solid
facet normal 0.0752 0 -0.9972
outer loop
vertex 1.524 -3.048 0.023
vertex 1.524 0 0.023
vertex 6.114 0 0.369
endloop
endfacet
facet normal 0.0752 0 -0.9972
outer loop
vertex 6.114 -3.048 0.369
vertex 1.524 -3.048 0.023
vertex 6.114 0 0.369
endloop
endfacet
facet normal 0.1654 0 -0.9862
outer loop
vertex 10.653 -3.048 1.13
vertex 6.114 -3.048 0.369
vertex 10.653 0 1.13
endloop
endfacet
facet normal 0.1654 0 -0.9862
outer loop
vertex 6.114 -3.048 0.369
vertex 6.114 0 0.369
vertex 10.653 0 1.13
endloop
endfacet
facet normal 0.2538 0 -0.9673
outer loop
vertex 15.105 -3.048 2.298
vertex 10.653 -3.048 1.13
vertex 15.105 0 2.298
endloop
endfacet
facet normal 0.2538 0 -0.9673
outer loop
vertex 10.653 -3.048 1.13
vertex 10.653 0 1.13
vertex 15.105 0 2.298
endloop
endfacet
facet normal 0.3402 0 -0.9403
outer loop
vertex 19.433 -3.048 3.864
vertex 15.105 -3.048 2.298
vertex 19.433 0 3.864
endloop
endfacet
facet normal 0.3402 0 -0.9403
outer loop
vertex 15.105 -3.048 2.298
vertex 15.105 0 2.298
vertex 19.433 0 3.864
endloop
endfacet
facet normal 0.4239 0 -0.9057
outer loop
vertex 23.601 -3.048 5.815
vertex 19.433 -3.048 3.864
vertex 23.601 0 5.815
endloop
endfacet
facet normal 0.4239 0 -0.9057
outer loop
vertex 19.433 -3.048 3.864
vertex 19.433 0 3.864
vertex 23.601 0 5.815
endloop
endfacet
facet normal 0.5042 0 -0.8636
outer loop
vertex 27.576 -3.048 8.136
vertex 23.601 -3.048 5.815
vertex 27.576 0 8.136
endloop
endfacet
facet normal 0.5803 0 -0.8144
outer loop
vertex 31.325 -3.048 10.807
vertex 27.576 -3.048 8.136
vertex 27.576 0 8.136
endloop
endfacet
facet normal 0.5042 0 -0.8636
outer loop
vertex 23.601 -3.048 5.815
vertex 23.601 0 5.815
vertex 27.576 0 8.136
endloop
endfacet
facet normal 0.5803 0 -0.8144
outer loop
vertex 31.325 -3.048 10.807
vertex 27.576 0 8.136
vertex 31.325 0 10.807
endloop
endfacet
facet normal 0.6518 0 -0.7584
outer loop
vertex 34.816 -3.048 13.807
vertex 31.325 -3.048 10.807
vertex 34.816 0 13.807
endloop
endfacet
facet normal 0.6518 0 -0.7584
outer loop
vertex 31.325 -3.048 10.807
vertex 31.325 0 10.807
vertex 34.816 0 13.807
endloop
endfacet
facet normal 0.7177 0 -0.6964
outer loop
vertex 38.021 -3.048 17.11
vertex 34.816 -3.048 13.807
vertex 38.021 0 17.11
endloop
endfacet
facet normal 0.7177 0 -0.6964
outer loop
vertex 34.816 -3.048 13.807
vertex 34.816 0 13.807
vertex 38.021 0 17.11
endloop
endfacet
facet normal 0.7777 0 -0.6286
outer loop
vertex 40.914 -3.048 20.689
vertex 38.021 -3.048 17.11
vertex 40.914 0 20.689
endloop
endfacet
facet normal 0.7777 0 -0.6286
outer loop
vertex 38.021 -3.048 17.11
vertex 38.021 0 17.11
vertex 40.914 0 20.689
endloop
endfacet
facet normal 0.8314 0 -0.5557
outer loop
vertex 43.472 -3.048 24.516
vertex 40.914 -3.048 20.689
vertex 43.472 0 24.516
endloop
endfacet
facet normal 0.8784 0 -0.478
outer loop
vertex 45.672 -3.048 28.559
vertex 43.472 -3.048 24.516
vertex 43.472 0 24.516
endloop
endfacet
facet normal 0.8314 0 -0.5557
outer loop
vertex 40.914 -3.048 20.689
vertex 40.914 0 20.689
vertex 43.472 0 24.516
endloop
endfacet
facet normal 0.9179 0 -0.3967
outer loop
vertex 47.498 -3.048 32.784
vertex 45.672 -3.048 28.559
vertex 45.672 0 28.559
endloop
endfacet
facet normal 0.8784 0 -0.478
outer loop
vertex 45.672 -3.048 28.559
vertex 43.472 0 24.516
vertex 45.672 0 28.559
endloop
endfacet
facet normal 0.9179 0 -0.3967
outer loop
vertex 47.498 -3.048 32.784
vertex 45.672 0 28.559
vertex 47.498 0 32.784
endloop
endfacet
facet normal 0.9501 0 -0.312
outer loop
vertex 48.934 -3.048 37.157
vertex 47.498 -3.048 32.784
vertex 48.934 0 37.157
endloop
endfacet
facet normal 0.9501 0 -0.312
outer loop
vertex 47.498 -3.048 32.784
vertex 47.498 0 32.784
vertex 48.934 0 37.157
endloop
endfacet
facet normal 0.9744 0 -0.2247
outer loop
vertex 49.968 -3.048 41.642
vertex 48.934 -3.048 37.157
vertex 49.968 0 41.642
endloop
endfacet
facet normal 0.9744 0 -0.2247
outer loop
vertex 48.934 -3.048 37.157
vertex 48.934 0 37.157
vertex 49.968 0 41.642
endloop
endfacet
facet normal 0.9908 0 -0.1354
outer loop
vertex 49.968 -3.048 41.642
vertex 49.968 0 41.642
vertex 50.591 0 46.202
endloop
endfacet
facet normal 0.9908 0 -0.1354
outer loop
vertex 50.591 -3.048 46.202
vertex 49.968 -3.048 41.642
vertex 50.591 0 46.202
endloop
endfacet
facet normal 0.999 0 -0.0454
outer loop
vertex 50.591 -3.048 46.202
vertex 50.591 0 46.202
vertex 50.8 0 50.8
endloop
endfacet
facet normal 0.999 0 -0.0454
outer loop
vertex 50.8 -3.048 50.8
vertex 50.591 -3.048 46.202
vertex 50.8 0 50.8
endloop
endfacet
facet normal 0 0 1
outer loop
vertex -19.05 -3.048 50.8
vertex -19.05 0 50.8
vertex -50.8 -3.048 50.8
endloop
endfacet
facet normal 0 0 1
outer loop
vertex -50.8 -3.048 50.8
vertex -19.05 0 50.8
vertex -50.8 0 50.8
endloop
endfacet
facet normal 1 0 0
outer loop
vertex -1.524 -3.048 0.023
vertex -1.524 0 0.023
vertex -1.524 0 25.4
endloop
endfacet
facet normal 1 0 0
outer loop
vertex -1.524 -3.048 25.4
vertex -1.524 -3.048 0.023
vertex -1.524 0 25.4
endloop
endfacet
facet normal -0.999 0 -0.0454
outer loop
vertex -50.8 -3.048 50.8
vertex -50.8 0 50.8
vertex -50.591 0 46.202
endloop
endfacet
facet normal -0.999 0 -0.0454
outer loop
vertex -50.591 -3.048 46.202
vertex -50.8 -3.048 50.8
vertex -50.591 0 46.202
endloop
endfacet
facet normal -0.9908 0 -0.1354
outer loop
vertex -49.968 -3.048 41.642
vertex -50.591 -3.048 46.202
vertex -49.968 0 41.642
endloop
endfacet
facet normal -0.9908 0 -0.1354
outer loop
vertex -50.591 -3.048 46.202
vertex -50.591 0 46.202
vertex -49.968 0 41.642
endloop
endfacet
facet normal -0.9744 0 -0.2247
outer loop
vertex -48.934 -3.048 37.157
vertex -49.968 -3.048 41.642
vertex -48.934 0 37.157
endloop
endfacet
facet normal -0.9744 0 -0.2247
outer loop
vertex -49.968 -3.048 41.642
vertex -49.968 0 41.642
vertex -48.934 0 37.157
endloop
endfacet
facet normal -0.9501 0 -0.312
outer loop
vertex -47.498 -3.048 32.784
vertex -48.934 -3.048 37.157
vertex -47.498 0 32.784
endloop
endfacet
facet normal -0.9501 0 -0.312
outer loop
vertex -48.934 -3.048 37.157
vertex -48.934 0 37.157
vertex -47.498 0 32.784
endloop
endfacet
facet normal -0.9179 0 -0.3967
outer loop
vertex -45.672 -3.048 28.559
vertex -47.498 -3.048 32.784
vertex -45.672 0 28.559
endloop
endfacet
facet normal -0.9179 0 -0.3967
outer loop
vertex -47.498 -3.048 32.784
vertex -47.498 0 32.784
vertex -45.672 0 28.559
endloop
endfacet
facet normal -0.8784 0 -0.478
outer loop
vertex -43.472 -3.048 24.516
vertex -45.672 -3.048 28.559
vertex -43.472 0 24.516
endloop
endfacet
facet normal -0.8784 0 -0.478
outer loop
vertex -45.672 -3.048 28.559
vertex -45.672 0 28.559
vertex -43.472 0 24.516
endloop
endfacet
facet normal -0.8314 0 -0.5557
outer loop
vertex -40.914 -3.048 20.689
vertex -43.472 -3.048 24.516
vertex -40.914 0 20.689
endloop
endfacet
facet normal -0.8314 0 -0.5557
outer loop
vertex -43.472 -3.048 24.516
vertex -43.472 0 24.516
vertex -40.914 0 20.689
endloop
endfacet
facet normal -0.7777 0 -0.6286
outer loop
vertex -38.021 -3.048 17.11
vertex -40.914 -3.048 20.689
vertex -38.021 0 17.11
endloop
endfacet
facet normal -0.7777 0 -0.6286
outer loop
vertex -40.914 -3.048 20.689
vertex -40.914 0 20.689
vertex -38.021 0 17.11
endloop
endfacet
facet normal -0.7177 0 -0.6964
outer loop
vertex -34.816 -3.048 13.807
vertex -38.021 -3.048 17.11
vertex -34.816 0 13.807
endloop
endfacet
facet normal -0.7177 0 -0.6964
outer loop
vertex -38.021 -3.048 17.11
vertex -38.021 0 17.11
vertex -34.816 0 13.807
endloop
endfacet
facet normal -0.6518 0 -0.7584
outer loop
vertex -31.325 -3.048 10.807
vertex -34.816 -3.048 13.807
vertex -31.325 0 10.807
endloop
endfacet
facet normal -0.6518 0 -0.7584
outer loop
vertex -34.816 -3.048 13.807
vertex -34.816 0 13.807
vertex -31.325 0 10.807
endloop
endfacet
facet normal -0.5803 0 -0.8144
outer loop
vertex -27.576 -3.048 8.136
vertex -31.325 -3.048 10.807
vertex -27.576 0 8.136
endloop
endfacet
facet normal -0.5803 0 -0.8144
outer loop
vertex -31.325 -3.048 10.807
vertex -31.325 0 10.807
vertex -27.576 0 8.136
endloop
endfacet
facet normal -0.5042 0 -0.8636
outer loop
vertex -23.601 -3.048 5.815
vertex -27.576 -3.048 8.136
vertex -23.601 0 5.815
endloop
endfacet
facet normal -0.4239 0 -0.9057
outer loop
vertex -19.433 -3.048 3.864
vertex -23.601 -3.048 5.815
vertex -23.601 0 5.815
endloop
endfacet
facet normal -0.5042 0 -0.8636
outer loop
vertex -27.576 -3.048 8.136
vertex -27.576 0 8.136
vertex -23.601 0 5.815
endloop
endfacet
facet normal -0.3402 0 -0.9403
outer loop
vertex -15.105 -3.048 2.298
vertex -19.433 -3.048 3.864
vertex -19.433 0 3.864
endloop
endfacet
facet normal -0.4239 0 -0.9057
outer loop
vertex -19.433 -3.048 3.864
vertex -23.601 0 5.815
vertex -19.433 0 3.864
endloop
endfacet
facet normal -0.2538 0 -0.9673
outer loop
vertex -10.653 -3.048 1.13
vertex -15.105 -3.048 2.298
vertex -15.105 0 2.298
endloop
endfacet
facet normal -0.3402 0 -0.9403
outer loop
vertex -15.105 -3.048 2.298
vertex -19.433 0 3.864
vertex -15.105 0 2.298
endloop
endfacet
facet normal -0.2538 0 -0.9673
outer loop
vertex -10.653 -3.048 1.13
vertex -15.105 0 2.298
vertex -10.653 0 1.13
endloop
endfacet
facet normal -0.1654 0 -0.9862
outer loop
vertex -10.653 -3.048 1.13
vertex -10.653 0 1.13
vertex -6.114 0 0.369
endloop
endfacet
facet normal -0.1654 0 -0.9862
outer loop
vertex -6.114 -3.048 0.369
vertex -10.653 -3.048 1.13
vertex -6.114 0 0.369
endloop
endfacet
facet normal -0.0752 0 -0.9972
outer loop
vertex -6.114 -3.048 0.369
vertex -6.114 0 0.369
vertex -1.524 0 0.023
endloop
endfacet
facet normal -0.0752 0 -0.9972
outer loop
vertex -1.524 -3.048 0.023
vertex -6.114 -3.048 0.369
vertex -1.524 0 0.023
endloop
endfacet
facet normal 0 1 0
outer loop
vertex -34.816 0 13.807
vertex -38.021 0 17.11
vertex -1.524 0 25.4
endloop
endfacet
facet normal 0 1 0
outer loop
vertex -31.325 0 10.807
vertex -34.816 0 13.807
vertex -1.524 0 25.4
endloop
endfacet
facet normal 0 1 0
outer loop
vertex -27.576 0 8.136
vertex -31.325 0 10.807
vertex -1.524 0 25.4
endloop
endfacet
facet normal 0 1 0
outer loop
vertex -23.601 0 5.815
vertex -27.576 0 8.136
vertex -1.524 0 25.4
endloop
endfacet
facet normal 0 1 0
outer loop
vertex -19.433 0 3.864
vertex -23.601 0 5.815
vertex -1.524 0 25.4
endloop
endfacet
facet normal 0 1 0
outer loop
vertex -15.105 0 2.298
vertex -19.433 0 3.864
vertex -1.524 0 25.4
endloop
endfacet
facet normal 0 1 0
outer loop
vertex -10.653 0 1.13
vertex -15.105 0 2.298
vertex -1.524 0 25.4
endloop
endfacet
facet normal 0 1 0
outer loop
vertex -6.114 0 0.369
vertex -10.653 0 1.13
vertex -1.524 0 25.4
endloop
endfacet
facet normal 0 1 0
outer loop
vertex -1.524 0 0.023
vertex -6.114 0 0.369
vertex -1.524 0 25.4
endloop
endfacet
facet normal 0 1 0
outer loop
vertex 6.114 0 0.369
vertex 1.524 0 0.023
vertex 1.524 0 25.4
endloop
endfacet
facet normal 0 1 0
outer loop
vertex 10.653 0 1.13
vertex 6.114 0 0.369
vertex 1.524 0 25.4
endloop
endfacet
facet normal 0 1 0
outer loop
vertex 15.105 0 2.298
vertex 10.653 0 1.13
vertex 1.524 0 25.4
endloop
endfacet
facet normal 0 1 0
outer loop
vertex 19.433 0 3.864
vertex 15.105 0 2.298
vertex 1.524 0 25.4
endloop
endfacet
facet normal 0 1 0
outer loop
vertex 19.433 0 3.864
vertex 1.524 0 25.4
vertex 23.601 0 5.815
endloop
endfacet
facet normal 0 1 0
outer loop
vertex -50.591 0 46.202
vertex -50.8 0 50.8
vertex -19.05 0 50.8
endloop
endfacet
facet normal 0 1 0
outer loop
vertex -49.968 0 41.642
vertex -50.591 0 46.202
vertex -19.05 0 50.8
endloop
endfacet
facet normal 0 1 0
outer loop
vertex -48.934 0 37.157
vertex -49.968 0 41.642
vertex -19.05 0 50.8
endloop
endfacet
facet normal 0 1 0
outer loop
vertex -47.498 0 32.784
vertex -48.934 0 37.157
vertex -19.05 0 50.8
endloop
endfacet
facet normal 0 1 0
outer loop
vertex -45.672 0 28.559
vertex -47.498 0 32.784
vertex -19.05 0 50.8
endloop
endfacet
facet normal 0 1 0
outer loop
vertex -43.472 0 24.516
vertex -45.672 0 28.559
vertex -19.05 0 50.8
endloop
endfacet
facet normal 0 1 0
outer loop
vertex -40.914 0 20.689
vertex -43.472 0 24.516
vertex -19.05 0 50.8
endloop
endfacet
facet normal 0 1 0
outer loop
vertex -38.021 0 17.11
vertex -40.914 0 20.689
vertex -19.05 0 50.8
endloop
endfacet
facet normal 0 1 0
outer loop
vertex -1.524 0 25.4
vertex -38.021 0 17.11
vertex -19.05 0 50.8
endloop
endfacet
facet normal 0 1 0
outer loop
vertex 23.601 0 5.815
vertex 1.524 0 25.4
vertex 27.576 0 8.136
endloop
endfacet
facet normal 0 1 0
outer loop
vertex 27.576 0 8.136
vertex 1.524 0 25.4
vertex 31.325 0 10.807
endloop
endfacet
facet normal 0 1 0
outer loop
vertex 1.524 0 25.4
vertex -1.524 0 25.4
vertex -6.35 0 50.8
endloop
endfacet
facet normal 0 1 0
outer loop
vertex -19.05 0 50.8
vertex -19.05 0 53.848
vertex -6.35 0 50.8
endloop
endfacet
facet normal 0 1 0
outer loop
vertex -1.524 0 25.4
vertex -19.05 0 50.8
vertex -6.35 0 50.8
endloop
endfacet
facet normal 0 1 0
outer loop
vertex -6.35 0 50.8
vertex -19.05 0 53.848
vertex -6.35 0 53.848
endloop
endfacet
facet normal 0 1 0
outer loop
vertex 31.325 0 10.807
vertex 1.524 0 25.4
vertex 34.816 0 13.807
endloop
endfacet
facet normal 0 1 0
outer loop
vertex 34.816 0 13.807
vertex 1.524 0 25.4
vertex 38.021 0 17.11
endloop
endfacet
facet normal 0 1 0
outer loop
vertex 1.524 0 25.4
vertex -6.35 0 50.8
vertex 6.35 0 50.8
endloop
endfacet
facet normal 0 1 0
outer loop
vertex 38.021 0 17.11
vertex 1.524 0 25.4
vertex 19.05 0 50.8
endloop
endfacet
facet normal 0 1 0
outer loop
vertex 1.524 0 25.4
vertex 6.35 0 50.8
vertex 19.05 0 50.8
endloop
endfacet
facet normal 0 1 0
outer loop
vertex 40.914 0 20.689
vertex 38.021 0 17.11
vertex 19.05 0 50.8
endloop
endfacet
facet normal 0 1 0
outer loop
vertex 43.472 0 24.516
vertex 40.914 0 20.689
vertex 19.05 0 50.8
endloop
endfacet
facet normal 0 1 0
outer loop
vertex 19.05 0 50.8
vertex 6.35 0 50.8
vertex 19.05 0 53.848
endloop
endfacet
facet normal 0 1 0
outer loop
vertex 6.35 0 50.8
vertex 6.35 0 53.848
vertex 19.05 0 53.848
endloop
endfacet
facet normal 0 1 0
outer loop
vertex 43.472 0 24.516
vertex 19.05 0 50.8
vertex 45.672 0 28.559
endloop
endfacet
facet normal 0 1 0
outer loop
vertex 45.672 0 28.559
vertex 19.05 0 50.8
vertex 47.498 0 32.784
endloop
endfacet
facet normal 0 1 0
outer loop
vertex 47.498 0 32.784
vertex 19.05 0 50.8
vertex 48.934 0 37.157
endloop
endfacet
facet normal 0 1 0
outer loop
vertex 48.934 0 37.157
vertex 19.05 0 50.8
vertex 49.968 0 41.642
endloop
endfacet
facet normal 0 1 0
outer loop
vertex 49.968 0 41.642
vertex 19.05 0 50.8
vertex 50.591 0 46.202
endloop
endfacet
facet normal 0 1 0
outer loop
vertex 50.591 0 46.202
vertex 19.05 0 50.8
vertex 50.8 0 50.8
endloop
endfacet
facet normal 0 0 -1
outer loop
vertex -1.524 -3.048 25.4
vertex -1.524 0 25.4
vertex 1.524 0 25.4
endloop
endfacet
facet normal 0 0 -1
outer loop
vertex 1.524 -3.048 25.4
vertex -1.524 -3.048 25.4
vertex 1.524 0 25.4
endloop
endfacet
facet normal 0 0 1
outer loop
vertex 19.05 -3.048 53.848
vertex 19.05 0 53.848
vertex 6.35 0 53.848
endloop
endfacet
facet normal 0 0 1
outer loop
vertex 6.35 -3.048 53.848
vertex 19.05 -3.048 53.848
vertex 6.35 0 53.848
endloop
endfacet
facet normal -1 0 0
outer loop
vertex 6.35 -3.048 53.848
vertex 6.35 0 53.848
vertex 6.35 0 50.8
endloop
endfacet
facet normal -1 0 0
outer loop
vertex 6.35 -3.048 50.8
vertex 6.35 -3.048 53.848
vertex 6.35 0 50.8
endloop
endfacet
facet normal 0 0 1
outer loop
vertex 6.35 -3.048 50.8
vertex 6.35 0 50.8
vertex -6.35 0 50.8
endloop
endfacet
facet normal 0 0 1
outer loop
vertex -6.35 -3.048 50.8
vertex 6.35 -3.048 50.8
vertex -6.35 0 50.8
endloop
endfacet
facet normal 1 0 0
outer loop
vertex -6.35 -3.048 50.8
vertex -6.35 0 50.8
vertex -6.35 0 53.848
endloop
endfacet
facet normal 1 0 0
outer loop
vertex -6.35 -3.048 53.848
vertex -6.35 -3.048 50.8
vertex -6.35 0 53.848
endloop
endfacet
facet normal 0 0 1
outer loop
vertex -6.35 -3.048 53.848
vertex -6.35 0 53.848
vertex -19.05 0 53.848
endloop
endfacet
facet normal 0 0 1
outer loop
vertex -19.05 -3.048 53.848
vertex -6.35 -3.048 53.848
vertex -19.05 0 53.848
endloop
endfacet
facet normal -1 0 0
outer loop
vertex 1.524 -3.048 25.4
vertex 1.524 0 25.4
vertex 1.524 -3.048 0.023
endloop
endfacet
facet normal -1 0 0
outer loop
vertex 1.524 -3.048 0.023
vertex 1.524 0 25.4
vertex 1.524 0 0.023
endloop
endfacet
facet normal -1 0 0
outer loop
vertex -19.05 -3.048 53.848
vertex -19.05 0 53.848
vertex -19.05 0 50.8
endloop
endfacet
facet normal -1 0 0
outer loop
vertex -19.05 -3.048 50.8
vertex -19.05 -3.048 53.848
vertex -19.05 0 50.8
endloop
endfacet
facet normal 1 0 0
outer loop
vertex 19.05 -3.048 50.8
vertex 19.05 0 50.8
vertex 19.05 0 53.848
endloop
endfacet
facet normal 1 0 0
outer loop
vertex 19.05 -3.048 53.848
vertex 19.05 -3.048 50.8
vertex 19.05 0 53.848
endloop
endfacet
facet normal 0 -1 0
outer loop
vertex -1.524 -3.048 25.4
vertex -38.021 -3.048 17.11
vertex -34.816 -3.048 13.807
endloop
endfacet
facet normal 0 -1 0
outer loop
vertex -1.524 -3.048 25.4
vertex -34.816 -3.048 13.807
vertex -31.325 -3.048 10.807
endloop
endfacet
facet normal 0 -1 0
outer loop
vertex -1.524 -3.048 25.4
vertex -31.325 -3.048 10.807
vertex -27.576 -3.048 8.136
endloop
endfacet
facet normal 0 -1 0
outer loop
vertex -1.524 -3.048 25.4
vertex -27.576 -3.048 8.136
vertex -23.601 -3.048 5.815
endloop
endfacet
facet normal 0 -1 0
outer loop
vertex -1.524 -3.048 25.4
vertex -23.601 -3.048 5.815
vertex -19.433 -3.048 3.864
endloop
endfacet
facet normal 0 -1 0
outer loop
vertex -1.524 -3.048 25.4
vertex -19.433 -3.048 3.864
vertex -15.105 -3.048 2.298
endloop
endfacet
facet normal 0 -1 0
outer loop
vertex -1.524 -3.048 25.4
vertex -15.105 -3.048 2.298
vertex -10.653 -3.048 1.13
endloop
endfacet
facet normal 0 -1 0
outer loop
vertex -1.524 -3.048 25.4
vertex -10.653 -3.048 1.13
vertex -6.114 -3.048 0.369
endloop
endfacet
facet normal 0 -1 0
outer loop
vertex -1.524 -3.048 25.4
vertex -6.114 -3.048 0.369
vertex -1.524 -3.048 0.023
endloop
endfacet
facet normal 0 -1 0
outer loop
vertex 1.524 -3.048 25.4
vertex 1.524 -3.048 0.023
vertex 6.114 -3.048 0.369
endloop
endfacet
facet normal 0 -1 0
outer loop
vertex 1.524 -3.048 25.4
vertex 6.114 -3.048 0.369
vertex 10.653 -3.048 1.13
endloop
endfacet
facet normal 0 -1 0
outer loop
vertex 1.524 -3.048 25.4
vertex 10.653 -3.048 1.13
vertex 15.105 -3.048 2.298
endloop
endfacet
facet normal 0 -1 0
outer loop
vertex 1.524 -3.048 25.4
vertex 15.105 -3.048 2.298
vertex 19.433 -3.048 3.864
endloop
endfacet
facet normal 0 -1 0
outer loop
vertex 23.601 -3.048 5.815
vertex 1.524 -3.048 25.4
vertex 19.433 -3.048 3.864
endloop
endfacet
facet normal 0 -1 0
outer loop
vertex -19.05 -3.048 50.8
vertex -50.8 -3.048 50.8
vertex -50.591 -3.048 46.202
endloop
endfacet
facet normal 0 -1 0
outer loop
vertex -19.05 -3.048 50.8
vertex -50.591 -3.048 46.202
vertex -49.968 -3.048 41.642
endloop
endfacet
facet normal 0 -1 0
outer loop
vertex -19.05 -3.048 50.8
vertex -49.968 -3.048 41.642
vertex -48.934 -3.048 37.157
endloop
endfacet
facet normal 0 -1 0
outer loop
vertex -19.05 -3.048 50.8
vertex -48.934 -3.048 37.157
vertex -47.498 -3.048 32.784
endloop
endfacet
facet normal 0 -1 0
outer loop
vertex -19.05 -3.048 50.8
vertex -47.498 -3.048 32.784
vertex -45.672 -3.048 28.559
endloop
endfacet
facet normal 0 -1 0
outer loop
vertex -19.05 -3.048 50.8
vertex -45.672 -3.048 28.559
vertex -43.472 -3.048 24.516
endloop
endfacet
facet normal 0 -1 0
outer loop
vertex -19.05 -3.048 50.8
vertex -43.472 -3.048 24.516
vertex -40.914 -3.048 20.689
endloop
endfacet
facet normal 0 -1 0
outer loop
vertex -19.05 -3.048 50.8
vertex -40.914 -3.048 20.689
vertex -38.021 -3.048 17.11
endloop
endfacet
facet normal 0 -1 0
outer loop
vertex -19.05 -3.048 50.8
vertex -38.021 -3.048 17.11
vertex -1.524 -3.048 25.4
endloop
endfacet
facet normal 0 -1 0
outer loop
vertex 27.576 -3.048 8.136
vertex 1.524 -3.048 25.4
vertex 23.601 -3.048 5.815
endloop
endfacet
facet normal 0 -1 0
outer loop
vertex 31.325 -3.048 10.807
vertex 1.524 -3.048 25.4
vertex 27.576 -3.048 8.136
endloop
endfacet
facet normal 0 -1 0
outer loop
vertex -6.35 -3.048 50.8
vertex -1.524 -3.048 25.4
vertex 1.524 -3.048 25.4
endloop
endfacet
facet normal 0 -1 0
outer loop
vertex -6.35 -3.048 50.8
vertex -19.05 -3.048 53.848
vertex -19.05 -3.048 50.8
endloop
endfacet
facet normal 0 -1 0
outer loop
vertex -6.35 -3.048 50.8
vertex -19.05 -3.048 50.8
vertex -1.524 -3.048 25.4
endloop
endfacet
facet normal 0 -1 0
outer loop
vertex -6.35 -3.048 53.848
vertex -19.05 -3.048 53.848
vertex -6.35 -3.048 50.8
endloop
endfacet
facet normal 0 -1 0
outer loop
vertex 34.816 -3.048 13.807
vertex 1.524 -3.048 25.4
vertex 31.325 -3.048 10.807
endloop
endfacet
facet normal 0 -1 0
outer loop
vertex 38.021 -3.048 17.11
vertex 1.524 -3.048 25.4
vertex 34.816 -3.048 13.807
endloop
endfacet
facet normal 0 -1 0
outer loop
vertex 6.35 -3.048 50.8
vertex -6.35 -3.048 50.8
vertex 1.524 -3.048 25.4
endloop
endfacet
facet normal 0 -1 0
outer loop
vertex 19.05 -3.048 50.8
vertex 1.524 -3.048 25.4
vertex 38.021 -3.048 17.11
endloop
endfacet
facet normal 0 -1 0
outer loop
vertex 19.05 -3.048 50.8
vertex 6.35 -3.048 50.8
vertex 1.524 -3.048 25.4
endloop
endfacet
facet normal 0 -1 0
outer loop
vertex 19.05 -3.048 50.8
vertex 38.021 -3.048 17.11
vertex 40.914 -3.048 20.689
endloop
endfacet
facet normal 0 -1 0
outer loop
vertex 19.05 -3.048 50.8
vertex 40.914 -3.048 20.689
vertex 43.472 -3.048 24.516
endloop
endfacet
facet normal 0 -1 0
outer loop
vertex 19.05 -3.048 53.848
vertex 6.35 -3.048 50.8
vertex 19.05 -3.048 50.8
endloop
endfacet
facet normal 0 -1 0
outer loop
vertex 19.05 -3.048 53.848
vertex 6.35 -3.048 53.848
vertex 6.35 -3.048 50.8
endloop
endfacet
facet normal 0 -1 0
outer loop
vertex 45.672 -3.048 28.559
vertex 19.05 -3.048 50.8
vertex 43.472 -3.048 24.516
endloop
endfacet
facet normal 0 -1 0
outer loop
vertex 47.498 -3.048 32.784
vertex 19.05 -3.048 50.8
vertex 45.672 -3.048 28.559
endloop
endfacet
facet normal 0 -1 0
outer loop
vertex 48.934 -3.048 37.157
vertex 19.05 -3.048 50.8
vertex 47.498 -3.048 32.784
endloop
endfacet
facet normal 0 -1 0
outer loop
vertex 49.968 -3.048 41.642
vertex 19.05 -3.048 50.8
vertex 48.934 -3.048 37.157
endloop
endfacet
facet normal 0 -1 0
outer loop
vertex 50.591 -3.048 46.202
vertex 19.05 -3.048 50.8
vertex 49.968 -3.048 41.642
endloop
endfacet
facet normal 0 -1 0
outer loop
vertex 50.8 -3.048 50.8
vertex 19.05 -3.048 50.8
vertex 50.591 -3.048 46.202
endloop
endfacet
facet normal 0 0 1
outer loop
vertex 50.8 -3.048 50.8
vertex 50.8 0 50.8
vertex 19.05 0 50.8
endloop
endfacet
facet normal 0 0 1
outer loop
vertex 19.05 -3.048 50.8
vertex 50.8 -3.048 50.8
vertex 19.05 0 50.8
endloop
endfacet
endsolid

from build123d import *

# Parameters (mm, degrees)
F1_DEPTH = 3.048


with BuildPart() as f1:
    # F0 (on Front) → F1 (new body)
    with BuildSketch(Plane.XZ):
        with BuildLine():
            Line((-19.05, 50.8), (-50.8, 50.8))
            ThreePointArc((-50.8, 50.8), (-36.455858, 15.421894), (-1.524, 0.022865))
            Line((-1.524, 0.022865), (-1.524, 25.4))
            Line((-1.524, 25.4), (1.524, 25.4))
            Line((1.524, 25.4), (1.524, 0.022865))
            ThreePointArc((1.524, 0.022865), (36.455858, 15.421894), (50.8, 50.8))
            Line((50.8, 50.8), (19.05, 50.8))
            Line((19.05, 50.8), (19.05, 53.848))
            Line((19.05, 53.848), (6.35, 53.848))
            Line((6.35, 53.848), (6.35, 50.8))
            Line((6.35, 50.8), (-6.35, 50.8))
            Line((-6.35, 50.8), (-6.35, 53.848))
            Line((-6.35, 53.848), (-19.05, 53.848))
            Line((-19.05, 53.848), (-19.05, 50.8))
        make_face()
    extrude(amount=F1_DEPTH)


solid = f1.part
